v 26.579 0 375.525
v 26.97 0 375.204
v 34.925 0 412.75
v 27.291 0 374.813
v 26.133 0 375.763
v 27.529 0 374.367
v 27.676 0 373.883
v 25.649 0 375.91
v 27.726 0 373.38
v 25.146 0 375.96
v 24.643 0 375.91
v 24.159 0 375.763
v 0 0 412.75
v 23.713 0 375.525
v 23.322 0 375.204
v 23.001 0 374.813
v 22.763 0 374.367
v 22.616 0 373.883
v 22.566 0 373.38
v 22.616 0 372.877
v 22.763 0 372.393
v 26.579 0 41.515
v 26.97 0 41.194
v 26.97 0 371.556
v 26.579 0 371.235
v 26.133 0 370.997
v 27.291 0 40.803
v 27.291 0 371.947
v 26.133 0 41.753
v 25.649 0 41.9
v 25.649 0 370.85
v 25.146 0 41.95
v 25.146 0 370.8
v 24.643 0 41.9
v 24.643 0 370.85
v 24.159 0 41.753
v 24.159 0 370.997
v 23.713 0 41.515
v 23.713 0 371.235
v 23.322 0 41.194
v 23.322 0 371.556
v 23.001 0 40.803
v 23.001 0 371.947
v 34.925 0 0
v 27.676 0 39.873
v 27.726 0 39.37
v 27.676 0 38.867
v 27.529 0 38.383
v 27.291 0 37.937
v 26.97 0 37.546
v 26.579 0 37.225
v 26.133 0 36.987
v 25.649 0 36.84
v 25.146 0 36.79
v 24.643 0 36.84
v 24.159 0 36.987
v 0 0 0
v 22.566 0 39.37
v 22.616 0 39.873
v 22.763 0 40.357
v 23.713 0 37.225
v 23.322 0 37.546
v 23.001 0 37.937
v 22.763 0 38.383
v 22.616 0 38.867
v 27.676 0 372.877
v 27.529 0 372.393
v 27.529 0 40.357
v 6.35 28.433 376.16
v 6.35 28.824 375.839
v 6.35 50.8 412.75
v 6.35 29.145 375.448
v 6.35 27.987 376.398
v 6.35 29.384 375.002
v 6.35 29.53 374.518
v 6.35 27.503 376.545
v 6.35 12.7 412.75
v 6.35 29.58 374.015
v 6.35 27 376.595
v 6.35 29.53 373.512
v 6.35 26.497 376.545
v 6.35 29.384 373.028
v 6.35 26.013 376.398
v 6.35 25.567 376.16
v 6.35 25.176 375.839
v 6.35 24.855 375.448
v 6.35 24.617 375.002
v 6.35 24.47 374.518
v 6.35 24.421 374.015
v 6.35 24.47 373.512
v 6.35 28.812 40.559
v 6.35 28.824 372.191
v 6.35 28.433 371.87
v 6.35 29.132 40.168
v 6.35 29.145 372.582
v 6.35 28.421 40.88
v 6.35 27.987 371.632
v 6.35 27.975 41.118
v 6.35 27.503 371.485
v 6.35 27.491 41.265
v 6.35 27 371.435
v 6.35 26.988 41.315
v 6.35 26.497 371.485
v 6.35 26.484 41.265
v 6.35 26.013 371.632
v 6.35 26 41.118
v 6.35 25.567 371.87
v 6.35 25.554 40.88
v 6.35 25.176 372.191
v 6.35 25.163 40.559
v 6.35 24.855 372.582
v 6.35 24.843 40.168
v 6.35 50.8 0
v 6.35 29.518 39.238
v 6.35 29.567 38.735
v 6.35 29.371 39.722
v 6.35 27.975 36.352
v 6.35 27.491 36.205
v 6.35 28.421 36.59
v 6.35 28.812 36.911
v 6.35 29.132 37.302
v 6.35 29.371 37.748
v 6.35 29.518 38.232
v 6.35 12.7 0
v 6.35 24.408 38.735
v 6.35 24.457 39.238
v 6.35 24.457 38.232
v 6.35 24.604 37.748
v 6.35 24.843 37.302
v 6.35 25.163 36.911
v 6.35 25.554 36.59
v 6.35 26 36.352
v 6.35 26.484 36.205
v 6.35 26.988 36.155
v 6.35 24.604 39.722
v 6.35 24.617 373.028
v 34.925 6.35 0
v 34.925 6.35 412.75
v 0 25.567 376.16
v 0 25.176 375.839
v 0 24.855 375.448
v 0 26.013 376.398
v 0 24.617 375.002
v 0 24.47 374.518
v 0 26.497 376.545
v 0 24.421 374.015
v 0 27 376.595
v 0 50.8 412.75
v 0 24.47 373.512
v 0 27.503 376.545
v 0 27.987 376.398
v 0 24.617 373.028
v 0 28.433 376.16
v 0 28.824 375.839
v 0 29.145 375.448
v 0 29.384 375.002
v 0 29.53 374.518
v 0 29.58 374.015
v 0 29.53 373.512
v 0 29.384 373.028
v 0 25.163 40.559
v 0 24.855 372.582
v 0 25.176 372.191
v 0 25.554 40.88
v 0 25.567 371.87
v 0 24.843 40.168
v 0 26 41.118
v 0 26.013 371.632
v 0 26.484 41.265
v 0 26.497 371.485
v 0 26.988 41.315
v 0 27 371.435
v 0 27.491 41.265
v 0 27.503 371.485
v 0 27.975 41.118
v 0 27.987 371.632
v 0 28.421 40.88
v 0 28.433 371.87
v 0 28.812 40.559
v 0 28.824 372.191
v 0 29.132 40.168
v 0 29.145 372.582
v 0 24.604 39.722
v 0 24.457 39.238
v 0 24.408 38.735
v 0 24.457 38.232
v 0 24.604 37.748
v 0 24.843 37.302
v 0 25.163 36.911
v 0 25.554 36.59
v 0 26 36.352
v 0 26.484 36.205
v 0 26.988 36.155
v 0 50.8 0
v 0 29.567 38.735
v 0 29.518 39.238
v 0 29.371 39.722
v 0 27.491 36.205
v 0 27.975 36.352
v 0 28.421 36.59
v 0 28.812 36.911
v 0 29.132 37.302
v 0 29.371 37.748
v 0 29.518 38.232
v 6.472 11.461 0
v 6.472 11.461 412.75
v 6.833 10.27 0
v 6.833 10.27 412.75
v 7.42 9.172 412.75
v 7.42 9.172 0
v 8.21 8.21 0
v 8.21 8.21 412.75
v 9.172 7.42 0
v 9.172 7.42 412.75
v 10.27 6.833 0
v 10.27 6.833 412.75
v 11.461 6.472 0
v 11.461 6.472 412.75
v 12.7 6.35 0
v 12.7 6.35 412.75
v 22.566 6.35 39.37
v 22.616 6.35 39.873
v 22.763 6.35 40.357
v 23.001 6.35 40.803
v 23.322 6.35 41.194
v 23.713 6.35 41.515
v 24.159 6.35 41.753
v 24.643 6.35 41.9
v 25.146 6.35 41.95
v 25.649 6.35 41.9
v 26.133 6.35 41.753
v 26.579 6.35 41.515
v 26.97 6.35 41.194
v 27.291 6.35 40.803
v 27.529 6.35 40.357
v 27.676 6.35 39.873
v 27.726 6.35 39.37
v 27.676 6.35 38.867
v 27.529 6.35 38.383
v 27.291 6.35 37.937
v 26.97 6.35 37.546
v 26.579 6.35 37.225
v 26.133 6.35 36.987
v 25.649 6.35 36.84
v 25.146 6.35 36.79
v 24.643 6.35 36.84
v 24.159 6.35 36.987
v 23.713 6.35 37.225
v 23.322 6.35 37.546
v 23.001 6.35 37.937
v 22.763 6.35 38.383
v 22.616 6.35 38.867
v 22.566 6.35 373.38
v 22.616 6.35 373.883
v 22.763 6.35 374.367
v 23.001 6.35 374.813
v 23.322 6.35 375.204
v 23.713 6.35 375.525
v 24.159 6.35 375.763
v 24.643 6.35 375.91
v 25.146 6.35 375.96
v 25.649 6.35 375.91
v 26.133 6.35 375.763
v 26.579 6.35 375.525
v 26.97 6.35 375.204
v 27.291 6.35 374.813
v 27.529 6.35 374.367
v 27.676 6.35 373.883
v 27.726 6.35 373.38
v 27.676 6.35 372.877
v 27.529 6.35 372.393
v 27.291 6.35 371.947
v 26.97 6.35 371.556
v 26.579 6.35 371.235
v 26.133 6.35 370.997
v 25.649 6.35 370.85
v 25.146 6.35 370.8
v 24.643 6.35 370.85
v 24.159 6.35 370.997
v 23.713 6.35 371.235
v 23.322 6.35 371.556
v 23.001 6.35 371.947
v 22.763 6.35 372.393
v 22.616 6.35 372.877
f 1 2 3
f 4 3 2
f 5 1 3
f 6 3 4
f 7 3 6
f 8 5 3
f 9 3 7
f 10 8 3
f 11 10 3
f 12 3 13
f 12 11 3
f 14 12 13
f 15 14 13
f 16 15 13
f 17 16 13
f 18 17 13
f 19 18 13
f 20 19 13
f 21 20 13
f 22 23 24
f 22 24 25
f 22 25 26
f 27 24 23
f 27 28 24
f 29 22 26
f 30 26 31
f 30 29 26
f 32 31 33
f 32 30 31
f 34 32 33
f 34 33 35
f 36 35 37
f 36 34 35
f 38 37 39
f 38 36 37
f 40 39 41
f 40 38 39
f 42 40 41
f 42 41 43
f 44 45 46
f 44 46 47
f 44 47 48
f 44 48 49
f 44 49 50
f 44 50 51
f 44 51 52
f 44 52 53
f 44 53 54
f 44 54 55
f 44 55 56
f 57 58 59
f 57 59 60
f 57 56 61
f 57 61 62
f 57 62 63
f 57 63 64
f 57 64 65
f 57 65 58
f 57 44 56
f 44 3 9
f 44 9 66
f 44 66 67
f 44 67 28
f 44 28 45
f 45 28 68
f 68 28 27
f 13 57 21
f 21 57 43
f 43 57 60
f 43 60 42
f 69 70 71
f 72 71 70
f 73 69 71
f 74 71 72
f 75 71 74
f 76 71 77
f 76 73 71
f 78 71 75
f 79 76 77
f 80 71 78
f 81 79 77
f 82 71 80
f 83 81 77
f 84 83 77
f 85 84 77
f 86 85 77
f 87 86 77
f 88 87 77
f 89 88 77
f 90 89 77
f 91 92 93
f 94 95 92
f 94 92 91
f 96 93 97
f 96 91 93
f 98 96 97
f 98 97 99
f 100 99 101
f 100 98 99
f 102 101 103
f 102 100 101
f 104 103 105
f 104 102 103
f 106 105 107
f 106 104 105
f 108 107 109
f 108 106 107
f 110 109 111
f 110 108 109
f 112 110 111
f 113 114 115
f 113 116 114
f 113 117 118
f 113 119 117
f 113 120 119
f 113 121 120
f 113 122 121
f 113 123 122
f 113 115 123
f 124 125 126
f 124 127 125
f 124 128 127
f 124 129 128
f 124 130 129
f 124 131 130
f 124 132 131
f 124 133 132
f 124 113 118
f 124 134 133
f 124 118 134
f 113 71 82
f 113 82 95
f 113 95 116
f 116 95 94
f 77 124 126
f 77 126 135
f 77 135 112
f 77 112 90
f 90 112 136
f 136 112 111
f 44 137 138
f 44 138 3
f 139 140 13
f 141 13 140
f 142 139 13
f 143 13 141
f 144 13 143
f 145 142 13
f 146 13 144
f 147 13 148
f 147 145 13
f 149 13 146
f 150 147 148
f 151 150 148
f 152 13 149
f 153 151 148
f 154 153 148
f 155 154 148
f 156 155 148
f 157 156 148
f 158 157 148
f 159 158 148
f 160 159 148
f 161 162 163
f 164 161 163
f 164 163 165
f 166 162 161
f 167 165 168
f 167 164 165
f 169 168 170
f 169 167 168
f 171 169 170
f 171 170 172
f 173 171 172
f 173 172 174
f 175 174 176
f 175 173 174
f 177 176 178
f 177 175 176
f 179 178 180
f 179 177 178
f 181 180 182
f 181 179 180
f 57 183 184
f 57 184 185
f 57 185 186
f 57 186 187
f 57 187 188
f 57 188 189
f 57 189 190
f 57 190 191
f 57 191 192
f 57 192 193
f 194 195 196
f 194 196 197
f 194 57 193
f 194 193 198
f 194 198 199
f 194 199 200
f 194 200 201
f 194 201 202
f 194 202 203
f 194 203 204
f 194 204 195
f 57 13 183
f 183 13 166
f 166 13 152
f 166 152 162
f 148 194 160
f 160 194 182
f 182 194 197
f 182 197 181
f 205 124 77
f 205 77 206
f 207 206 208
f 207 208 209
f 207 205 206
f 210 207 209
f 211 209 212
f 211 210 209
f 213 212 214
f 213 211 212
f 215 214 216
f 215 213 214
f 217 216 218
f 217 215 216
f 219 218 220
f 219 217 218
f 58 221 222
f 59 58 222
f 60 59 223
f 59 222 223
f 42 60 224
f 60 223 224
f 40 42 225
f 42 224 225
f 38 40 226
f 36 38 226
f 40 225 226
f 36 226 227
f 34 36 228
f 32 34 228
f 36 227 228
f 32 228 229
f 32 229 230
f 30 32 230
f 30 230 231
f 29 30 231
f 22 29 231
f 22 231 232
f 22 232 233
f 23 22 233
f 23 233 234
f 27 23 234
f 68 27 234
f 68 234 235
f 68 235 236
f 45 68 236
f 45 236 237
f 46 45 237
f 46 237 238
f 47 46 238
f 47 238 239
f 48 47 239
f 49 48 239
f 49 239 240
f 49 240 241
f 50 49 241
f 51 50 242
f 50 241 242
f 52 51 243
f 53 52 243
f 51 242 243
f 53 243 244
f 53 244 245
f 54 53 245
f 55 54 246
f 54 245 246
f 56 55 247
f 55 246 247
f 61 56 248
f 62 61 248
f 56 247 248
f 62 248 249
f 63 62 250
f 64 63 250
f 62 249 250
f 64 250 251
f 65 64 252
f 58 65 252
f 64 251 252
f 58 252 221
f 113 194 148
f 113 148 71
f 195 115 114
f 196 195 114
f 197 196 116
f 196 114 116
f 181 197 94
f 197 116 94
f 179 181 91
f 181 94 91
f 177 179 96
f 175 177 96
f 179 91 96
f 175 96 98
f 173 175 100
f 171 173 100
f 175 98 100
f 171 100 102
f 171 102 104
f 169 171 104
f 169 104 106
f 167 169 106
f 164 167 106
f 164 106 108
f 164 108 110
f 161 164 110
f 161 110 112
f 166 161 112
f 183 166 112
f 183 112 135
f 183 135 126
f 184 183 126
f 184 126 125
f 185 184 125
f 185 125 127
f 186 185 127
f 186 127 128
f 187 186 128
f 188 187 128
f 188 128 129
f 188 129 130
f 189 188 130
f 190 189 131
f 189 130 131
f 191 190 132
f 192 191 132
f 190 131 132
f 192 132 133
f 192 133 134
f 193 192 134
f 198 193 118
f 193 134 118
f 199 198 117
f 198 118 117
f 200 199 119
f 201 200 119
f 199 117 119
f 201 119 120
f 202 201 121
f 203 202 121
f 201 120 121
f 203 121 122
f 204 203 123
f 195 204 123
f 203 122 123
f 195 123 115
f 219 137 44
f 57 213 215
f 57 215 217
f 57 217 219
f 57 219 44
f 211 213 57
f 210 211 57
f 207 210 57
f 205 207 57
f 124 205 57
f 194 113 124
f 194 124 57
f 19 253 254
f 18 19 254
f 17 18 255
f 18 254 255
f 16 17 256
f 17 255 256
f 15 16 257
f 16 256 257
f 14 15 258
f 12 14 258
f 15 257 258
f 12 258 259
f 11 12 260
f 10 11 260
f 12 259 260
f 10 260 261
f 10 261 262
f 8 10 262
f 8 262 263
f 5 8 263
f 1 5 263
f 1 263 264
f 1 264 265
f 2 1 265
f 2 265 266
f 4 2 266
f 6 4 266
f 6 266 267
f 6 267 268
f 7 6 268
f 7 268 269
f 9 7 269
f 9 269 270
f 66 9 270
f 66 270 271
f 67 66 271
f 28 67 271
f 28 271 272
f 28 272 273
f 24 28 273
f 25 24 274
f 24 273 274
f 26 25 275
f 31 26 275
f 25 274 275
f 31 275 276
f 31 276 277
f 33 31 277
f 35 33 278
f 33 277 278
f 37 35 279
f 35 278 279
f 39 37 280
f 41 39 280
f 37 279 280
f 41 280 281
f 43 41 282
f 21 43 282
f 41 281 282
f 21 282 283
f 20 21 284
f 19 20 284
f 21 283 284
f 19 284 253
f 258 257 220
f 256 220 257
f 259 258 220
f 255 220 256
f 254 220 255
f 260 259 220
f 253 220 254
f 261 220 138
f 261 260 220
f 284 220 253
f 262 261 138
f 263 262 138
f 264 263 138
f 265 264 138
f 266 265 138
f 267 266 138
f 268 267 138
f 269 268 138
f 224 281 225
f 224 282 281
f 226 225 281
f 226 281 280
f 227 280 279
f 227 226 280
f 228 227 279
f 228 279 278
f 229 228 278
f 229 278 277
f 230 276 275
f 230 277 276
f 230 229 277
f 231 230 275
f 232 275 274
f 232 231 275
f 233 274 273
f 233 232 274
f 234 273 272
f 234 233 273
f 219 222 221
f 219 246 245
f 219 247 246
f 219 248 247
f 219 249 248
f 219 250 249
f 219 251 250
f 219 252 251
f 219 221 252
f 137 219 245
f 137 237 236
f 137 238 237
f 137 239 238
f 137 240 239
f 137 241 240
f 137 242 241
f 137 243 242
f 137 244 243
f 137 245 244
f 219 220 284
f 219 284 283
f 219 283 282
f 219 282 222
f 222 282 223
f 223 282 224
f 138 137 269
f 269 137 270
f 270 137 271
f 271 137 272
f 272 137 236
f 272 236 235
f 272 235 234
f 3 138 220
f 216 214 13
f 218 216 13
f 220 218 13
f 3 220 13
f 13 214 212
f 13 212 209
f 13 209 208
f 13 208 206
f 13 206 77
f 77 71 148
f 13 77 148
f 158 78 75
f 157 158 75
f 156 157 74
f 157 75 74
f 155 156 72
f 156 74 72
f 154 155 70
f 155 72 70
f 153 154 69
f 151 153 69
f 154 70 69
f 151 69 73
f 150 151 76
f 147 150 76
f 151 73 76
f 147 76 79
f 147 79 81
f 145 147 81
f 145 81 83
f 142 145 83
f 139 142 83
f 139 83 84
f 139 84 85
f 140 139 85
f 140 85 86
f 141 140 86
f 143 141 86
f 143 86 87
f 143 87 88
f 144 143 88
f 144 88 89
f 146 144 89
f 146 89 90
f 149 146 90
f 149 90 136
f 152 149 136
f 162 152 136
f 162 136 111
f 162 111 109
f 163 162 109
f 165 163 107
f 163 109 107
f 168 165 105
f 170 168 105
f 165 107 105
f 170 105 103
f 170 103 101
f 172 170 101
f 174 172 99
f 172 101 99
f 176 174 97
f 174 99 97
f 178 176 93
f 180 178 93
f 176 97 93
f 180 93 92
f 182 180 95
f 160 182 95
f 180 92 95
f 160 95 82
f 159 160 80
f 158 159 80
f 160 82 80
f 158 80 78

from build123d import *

# Parameters (mm, degrees)
BOSS_EXTRUDE1_DEPTH = 412.75
SKETCH2_R           = 2.5796875
CUT_EXTRUDE1_DEPTH  = 417.844974931
SKETCH3_R           = 2.5796875
CUT_EXTRUDE2_DEPTH  = 417.60307323


with BuildPart() as part:
    # Sketch1 → Boss-Extrude1 (new body)
    with BuildSketch(Plane.XY):
        with BuildLine():
            Line((0, 0), (0, 50.8))
            Line((0, 50.8), (6.35, 50.8))
            Line((6.35, 50.8), (6.35, 12.7))
            ThreePointArc((6.35, 12.7), (8.209871939, 8.209871939), (12.7, 6.35))
            Line((12.7, 6.35), (34.925, 6.35))
            Line((34.925, 6.35), (34.925, 0))
            Line((34.925, 0), (0, 0))
        make_face()
    extrude(amount=BOSS_EXTRUDE1_DEPTH)

    # Sketch2 → Cut-Extrude1 (cut, through all)
    with BuildSketch(Plane(origin=(6.35, 0, 0), x_dir=(0, 0, -1), z_dir=(1, 0, 0))):
        with Locations(Location((-374.015, 27.0002, 0), (0, 0, 90))):
            Circle(SKETCH2_R)
        with Locations(Location((-38.735, 26.9875, 0), (0, 0, 90))):
            Circle(SKETCH2_R)
    extrude(amount=-CUT_EXTRUDE1_DEPTH, mode=Mode.SUBTRACT)

    # Sketch3 → Cut-Extrude2 (cut, through all)
    with BuildSketch(Plane(origin=(0, 6.35, 0), x_dir=(1, 0, 0), z_dir=(0, 1, 0))):
        with Locations(Location((25.146, -373.38, 0), (0, 0, 180))):
            Circle(SKETCH3_R)
        with Locations(Location((25.146, -39.37, 0), (0, 0, 180))):
            Circle(SKETCH3_R)
    extrude(amount=-CUT_EXTRUDE2_DEPTH, mode=Mode.SUBTRACT)


solid = part.part
